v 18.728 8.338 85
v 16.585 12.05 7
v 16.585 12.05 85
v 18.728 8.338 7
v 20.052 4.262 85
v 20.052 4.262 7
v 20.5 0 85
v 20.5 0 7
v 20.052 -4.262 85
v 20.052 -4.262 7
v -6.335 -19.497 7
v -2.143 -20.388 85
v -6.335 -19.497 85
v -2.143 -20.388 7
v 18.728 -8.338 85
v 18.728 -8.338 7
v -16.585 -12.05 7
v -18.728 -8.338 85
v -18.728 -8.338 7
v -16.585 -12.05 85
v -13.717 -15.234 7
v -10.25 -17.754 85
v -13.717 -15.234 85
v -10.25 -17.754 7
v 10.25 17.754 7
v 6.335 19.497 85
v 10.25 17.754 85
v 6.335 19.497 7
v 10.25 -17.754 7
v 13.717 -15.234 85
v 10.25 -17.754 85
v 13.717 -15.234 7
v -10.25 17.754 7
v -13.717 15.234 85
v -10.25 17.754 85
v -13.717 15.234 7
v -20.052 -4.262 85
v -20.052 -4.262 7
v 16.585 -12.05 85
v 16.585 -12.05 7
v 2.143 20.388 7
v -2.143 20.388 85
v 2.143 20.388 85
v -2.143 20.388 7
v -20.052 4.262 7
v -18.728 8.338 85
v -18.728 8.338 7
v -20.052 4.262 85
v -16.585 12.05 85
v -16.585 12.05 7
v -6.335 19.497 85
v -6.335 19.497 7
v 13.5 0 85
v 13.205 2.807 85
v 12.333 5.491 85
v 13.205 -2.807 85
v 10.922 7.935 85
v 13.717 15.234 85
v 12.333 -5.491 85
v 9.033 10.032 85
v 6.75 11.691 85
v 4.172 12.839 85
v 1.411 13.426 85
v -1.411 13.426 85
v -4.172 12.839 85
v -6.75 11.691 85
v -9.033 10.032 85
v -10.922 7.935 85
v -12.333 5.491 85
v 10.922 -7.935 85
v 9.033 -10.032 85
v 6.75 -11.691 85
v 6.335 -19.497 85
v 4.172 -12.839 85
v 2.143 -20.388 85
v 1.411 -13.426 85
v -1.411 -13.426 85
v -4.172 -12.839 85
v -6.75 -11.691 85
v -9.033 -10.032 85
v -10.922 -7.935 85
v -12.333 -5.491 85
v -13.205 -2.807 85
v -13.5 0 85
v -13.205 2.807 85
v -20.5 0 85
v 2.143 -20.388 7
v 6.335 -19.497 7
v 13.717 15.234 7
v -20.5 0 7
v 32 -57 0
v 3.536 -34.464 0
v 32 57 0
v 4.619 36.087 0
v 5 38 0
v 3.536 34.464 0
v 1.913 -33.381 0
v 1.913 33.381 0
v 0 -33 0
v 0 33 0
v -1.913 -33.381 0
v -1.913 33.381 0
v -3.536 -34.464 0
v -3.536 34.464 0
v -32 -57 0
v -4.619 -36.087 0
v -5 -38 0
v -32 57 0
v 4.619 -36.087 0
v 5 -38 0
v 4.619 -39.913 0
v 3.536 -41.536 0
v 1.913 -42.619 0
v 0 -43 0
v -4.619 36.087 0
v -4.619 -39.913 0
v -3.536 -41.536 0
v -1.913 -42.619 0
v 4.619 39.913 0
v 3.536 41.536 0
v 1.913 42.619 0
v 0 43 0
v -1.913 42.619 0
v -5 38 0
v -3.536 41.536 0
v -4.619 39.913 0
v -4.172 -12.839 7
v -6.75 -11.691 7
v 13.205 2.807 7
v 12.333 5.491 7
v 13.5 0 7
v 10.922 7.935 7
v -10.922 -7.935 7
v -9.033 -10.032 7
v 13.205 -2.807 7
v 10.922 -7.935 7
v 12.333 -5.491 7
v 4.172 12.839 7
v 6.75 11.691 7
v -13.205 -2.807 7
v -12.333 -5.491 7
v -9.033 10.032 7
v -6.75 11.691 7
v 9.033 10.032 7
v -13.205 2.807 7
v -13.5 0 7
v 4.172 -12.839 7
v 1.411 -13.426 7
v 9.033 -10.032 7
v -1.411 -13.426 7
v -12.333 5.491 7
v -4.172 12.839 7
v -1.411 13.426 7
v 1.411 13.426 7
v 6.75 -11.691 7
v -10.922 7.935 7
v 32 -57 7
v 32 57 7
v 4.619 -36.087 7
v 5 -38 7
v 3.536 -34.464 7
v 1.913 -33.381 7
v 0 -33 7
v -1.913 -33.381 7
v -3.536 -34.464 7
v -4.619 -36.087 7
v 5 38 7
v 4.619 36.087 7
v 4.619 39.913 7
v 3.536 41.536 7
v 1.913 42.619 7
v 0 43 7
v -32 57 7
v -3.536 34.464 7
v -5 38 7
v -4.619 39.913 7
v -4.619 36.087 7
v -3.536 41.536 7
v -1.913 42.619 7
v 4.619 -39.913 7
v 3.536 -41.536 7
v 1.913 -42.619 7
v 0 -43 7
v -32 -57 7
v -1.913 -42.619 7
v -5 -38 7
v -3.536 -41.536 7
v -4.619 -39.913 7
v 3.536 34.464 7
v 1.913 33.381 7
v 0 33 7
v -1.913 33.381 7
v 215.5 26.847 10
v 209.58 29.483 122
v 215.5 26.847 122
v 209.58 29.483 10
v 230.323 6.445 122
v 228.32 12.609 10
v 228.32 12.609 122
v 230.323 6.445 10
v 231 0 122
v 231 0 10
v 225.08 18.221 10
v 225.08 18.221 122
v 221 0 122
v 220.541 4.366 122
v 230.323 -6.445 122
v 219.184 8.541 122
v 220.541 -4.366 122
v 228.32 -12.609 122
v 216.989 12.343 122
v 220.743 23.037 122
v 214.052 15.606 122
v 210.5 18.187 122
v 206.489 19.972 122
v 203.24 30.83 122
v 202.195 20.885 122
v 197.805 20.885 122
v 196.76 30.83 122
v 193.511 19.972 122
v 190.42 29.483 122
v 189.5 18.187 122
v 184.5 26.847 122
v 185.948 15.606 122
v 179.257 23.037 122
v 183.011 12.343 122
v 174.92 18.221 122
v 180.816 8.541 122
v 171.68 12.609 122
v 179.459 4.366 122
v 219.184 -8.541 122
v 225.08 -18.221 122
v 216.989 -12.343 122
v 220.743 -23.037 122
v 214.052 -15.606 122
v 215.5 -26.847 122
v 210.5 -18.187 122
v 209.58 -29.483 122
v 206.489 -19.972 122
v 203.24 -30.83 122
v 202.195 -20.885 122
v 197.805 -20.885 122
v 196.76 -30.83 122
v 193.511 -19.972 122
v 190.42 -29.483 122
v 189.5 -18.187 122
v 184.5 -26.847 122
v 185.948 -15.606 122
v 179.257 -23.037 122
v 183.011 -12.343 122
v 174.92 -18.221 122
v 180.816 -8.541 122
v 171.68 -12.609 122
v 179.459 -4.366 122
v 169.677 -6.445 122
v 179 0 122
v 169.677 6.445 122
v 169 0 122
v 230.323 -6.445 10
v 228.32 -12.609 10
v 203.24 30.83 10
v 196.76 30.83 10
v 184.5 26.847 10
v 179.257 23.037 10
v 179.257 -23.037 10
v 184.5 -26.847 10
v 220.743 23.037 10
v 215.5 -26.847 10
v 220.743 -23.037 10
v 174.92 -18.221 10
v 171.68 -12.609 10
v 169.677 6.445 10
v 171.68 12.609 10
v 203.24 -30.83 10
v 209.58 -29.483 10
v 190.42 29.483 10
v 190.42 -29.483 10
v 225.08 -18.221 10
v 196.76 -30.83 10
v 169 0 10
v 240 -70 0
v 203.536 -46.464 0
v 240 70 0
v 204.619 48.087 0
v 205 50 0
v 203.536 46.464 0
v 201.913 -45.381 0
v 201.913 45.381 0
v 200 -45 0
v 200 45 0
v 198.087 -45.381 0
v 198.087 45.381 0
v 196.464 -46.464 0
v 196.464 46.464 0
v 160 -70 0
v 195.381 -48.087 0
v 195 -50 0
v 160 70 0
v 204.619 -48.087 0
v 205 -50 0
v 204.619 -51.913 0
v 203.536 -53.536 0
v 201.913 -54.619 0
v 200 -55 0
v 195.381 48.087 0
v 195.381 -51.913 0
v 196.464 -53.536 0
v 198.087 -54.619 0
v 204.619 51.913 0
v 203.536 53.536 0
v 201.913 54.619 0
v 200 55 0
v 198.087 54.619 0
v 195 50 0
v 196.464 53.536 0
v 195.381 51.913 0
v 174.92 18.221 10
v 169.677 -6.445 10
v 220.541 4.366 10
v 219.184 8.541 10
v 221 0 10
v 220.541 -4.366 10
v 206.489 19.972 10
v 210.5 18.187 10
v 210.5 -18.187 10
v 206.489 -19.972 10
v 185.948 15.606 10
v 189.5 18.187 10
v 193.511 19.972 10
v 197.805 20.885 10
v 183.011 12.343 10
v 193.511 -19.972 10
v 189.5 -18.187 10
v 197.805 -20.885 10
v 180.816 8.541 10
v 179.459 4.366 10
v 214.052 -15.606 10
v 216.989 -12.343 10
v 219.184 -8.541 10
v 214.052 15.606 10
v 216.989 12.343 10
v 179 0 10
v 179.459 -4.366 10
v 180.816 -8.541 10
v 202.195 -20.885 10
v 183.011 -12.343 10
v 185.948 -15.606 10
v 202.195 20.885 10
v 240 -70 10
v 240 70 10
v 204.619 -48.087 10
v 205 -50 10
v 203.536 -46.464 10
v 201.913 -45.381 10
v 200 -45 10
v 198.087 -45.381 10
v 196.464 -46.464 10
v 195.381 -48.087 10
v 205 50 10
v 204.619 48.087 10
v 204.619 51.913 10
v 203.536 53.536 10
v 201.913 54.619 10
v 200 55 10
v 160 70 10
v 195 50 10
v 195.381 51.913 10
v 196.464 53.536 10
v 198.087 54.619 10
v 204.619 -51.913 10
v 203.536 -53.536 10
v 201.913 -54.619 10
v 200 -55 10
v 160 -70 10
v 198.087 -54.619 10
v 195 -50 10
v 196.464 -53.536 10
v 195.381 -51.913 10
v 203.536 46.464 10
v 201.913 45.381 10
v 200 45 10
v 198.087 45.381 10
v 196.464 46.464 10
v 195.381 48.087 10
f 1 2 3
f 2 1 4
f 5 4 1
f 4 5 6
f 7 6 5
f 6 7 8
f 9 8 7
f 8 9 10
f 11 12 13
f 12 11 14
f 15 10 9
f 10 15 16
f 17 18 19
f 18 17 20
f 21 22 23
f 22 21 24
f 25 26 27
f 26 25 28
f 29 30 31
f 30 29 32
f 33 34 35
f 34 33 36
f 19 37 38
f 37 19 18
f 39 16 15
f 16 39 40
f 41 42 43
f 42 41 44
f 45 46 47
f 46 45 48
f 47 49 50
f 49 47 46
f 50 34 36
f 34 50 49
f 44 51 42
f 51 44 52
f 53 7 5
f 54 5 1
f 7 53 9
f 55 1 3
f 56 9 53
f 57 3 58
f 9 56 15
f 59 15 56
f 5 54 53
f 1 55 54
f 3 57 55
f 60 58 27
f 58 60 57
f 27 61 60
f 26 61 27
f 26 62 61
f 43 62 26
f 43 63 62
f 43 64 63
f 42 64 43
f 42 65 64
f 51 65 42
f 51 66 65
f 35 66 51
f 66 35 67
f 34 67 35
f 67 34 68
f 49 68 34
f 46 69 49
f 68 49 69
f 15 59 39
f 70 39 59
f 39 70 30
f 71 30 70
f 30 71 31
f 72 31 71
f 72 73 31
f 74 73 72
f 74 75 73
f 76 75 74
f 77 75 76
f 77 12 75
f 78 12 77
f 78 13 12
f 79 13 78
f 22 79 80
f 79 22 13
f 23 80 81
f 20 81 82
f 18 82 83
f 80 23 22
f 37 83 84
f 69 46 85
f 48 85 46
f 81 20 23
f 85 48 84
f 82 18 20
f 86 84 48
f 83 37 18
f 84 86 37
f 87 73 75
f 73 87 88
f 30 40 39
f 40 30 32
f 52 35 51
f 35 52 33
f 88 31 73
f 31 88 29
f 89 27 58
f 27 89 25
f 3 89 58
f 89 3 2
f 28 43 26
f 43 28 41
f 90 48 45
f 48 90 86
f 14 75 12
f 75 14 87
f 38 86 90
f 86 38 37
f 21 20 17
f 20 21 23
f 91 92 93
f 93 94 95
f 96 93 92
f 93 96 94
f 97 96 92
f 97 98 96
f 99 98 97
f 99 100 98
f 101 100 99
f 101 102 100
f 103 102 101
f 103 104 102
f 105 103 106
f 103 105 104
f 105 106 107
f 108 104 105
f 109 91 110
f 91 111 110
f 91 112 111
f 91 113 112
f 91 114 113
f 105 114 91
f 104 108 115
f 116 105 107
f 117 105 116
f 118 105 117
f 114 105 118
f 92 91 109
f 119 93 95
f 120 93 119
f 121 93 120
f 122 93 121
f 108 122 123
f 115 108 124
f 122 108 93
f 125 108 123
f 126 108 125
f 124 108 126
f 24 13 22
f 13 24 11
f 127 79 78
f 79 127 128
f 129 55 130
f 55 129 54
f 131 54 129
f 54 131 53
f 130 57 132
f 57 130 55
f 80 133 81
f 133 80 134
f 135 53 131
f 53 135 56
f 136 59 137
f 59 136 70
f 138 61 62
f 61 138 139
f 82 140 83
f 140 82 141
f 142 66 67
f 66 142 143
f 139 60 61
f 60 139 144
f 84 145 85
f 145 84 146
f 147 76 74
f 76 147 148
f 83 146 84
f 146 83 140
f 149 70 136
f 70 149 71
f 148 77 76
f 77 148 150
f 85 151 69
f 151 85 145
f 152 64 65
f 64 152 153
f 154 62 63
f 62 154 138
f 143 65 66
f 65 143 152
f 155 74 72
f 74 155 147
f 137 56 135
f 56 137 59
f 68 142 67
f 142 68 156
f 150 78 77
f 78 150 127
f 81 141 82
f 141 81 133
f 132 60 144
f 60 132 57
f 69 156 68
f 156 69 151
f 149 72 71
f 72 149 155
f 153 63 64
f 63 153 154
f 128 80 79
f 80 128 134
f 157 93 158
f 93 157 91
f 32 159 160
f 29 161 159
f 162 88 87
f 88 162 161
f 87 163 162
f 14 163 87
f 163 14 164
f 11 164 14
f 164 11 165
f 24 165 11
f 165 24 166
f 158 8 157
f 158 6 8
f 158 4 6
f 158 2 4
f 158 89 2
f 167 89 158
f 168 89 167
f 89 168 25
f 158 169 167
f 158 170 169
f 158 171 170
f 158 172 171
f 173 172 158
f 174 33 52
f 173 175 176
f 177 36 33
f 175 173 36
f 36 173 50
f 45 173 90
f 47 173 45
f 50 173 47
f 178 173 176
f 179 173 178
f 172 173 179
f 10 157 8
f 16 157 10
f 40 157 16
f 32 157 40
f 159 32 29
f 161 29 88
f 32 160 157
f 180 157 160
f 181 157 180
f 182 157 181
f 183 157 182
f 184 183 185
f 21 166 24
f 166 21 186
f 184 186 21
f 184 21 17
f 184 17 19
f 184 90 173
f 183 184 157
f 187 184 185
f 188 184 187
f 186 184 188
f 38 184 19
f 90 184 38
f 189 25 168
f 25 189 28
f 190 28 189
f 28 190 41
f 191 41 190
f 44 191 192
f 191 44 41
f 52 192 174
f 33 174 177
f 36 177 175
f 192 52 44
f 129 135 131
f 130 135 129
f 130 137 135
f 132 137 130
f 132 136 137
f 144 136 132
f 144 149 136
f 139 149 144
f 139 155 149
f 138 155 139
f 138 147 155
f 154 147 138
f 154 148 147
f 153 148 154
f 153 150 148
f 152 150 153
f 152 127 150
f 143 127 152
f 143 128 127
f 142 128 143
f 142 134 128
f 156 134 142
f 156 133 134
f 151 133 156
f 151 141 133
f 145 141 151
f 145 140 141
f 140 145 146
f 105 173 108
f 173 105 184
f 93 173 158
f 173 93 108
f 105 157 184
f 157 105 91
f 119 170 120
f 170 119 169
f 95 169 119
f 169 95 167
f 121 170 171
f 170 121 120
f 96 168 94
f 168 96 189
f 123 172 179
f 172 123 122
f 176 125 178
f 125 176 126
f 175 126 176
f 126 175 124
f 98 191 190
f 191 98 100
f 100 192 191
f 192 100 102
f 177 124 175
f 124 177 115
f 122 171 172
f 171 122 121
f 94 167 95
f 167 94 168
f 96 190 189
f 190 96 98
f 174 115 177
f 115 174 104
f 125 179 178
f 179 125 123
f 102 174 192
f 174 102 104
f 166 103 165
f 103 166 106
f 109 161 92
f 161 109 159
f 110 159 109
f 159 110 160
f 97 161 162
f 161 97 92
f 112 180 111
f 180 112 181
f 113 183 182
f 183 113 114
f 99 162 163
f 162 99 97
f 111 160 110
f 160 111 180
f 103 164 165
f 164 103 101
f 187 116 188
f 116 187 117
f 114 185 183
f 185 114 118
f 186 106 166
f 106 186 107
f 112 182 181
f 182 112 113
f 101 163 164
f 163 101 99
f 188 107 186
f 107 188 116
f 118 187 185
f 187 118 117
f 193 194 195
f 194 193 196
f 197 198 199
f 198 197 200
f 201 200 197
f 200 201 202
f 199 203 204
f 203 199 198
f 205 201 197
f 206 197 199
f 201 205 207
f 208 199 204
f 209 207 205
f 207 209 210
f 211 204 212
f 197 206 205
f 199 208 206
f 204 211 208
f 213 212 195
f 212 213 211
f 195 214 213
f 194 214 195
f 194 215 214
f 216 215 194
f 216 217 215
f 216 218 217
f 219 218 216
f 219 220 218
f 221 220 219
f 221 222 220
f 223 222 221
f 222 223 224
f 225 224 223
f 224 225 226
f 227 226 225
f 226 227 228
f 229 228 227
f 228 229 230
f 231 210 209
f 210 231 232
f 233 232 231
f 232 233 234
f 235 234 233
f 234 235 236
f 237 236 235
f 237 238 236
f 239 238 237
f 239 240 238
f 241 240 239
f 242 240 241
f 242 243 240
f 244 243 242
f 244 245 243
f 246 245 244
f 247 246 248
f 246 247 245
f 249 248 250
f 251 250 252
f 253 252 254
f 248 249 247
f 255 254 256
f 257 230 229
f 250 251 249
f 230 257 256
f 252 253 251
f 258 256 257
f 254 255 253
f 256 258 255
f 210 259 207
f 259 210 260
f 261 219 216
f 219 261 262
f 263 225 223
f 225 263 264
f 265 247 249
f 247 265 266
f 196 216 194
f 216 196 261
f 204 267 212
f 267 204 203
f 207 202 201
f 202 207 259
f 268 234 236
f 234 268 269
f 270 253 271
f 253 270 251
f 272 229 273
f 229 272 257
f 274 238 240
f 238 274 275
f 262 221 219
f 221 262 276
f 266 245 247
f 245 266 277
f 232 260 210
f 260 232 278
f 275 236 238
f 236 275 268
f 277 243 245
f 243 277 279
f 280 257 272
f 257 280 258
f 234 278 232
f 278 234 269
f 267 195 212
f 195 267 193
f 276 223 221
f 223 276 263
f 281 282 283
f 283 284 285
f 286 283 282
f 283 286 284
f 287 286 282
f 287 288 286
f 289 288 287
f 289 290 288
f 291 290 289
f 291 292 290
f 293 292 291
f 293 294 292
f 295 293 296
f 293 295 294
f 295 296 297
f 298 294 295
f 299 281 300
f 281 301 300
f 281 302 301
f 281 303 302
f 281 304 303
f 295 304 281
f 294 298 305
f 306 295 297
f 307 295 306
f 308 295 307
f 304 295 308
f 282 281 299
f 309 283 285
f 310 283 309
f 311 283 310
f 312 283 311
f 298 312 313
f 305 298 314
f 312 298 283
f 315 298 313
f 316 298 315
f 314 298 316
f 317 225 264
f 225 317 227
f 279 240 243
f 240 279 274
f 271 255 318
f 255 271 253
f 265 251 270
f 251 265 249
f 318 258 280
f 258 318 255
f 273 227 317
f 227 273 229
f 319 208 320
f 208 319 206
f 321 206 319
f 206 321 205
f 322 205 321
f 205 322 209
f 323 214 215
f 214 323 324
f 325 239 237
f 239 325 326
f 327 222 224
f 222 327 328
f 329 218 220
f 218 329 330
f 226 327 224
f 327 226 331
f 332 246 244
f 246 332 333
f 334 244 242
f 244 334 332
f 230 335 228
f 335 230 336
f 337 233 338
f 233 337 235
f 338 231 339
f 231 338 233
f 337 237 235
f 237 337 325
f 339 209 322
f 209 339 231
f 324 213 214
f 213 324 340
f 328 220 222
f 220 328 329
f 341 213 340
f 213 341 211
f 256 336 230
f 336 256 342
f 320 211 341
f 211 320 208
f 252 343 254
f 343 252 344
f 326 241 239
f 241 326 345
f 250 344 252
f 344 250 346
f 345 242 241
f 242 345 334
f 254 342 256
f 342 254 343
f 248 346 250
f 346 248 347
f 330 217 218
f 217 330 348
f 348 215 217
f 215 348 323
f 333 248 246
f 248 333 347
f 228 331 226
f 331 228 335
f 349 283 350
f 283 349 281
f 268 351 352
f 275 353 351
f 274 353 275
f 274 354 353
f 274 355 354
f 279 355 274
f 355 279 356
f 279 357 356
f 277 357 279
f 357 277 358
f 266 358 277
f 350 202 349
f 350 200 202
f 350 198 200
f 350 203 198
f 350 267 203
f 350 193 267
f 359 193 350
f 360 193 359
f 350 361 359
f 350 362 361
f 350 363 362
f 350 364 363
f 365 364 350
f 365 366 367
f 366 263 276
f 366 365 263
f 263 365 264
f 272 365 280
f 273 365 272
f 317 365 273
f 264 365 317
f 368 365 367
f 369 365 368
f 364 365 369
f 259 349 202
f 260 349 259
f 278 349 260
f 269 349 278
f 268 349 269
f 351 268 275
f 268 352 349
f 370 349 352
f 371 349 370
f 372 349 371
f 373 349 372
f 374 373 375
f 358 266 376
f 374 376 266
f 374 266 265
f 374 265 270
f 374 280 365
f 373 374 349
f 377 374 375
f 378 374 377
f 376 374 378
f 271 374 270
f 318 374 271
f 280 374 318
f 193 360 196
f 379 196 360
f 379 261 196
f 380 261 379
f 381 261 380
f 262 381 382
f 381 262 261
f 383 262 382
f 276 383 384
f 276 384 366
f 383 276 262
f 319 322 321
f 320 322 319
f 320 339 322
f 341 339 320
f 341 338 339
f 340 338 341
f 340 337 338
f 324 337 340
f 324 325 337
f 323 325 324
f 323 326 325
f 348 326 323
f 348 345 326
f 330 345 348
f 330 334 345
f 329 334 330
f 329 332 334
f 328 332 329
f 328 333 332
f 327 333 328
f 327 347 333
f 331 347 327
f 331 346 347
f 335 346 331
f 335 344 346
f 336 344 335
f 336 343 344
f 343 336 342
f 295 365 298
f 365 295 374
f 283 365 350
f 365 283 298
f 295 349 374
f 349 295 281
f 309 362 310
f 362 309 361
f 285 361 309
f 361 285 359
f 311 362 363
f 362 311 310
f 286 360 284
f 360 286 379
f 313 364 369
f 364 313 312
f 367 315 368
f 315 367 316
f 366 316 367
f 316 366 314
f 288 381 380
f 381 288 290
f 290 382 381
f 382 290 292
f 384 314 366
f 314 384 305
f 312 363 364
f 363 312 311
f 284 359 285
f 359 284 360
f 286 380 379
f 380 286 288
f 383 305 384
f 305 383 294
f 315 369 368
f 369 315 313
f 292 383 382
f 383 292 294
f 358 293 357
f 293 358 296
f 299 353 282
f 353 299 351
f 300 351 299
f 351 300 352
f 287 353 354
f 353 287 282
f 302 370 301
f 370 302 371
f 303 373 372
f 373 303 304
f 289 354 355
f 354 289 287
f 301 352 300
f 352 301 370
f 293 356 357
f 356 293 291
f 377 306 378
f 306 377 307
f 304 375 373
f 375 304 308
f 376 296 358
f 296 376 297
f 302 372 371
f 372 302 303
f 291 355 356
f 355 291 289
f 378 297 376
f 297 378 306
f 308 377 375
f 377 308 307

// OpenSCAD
// file: tube_clamp_square_base_plate_132_functions.scad
function get_L_shaft_with_base_plate_square_base_plate_132(beam_width) = 
    // (beam_width == 40) ?
    75
;
function get_R_plate_square_base_plate_132(beam_width) = 
    // (beam_width == 40) ?
    [143, 75, 18.5]
;
function get_thickness_square_base_plate_132(beam_width) = 
    // (beam_width == 40) ?
    8
;
function get_offset_hole_x_square_base_plate_132(beam_width) = 
    // (beam_width == 40) ?
    100 / 2
;
function get_diameter_hole_square_base_plate_132(beam_width) = 
    // (beam_width == 40) ?
    10
;
// file: tube_clamp_round_3_way_through_116_functions.scad
function  get_L_shaft_long_round_3_way_through_116(tube_diameter) = 
    (tube_diameter == 27) ? 
        42
    : (tube_diameter == 42) ?
        60
    : 25
;
function get_thickness_round_3_way_through_116(tube_diameter) = 7;
function get_L_shaft_short_round_3_way_through_116(tube_diameter) = tube_diameter + 2 * get_thickness_round_3_way_through_116();
// file: tube_clamp_round_tee_long_104_functions.scad
// include <../../config.scad>;

function get_L_shaft_long_round_tee_long_104(tube_diameter) = 
    (tube_diameter == 27) ? 
        85
    : (tube_diameter == 42) ?
        122
    : 25
;
function get_L_shaft_short_round_tee_long_104(tube_diameter) = 
    (tube_diameter == 27) ? 
        42
    : (tube_diameter == 42) ?
        61
    : 10
;
// file: ../brake/brake_assembly_functions.scad
// include <../../config.scad>; // circular reference!

function get_y_pos_lead_fixing_ballscrew_to_brake_arms(angle_brake_rod, y_pos_axle_rear, x_pos_axle_leg_rear, x_offset_fixing_brake_arm_to_lead_plate) = y_pos_axle_rear + (x_pos_axle_leg_rear - x_offset_fixing_brake_arm_to_lead_plate) / tan(angle_brake_rod); // (X_POS_AXLE_LEG_REAR - X_OFFSET_FIXING_BRAKE_ARM_TO_LEAD_PLATE)
// file: ../common/metric_bolt_functions.scad
function get_metric_bolt_head_height(size) = size;
function get_metric_bolt_head_diameter(size) = size * 2;
function get_metric_bolt_washer_diameter_safe_working_clearance(size) = 
    (size < 20) ?
        4 * size
    :
        3 * size
;
// file: tube_clamp_round_base_plate_132_functions.scad
function get_L_shaft_with_base_plate_round_base_plate_132(tube_diameter) = 
    (tube_diameter == 27) ? 
        85
    : (tube_diameter == 42) ?
        122
    : 25
;
function get_R_plate_round_base_plate_132(tube_diameter) = 
    (tube_diameter == 27) ? 
        [64, 114, 7]
    : (tube_diameter == 42) ?
        [80, 140, 10]
    : [10, 20, 1]
;
function get_offset_hole_y_round_base_plate_132(tube_diameter) = 
    (tube_diameter == 27) ? 
        38
    : (tube_diameter == 42) ?
        50
    : 10
;
function get_diameter_hole_round_base_plate_132(tube_diameter) = 10;
// main file
include <../../config.scad>;
use <./tube_clamp_round_base_plate_132_functions.scad>;

module tube_clamp_round_base_plate_132(tube_diameter) {
    L_shaft_with_base_plate = get_L_shaft_with_base_plate_round_base_plate_132(tube_diameter);
    R_plate = get_R_plate_round_base_plate_132(tube_diameter);
    t = R_plate[2];
    offset_hole_y = get_offset_hole_y_round_base_plate_132(tube_diameter);
    d_hole_bolt_round_base_plate_132 = get_diameter_hole_round_base_plate_132(tube_diameter);
    color("LightGrey") union() {
        // cylinder section
        translate([0, 0, L_shaft_with_base_plate / 2]) difference() {
            cylinder(L_shaft_with_base_plate, tube_diameter / 2 + t, tube_diameter / 2 + t, center = true);
            cylinder(L_shaft_with_base_plate, tube_diameter / 2, tube_diameter / 2, center = true);
        }
        // base plate
        translate([0, 0, R_plate[2] / 2]) difference() {
            cube(R_plate, center = true);
            translate([0, offset_hole_y, 0]) cylinder(R_plate[2], d_hole_bolt_round_base_plate_132 / 2, d_hole_bolt_round_base_plate_132 / 2, center = true);
            translate([0, -offset_hole_y, 0]) cylinder(R_plate[2], d_hole_bolt_round_base_plate_132 / 2, d_hole_bolt_round_base_plate_132 / 2, center = true);
        }
    }
    // Shopping
    echo("Round base plate 132: Tube clamp - x1");
}

// test output
tube_clamp_round_base_plate_132(27);
translate([200, 0, 0]) tube_clamp_round_base_plate_132(42);
